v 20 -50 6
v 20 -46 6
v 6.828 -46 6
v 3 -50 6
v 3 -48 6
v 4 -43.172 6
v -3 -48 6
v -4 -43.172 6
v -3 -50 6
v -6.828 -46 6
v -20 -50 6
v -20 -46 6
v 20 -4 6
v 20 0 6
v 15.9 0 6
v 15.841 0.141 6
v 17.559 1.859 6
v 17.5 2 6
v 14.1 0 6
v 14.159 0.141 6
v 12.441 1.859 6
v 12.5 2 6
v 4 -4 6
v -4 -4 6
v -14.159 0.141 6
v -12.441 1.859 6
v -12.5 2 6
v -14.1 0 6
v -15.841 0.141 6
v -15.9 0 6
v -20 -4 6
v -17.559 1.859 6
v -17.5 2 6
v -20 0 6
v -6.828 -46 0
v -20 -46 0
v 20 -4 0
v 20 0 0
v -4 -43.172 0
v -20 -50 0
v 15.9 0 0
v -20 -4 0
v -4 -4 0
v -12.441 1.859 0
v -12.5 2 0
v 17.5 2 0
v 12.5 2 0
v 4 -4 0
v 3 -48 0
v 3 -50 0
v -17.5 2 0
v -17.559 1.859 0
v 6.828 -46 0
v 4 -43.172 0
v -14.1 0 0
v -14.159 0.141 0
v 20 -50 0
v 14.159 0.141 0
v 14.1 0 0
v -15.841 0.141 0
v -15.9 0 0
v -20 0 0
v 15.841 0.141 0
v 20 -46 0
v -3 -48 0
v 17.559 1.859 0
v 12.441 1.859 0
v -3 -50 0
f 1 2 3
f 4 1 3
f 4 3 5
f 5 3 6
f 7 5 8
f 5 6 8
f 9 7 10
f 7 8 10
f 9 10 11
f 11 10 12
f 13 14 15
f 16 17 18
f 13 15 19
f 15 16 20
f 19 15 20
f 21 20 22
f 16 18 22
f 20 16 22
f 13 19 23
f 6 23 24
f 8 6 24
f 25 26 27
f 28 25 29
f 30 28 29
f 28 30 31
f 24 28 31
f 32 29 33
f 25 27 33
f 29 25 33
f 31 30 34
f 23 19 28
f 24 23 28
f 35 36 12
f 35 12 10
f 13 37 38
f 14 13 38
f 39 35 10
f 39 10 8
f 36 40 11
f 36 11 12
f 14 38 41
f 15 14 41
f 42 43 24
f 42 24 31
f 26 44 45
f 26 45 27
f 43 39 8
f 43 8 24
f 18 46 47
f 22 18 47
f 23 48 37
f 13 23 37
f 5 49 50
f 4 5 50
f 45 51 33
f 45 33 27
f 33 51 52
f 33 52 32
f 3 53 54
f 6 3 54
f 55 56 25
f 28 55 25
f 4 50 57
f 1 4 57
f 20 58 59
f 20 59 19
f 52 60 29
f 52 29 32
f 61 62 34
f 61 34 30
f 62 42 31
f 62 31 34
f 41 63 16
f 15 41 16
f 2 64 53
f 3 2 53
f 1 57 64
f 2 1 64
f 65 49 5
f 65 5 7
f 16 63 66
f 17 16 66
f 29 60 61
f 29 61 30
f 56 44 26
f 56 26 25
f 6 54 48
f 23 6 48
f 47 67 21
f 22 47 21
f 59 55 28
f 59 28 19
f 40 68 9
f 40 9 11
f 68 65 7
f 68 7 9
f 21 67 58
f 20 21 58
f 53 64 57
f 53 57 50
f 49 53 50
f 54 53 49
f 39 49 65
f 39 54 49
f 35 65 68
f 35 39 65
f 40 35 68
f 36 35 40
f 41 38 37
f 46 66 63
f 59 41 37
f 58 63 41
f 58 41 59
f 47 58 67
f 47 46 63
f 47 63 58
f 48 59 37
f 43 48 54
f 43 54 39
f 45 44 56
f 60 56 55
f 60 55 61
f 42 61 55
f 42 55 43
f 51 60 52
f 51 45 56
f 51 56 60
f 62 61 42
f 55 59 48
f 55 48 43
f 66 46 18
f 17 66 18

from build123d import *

# Parameters (mm, degrees)
F1_DEPTH = 6
F3_DEPTH = 6
F4_SIZE  = 0.2


with BuildPart() as f1:
    # F0 (on Top) → F1 (new body)
    with BuildSketch(Plane.XY):
        Polygon((6.828427, -46), (4, -43.171573), (4, -46), align=None)
        Polygon((20, 0), (0, 0), (0, -48), (3, -48), (3, -50), (20, -50), (20, -46), (16, -46), (6.828427, -46), (4, -46), (4, -43.171573), (4, -4), (16, -4), (20, -4), align=None)
    extrude(amount=F1_DEPTH)

    # F2 (on Top) → F3 (join, through all)
    with BuildSketch(Plane.XY):
        Polygon((14.3, 0), (15.7, 0), (17.7, 2), (12.3, 2), align=None)
    extrude(amount=F3_DEPTH)

    # F4
    f4_edges = [f1.edges().sort_by_distance(p)[0] for p in [
        (17.7, 2, 3),
        (12.3, 2, 3),
        (15.7, 0, 3),
        (14.3, 0, 3),
    ]]
    chamfer(f4_edges, length=F4_SIZE)

    # F5: F1 across face


with BuildPart() as f1_1:
    add(f1.part)
    add(f1.part.mirror(Plane(origin=(0, -24, 3), x_dir=(0, -1, 0), z_dir=(-1, 0, 0))))


solid = f1_1.part
